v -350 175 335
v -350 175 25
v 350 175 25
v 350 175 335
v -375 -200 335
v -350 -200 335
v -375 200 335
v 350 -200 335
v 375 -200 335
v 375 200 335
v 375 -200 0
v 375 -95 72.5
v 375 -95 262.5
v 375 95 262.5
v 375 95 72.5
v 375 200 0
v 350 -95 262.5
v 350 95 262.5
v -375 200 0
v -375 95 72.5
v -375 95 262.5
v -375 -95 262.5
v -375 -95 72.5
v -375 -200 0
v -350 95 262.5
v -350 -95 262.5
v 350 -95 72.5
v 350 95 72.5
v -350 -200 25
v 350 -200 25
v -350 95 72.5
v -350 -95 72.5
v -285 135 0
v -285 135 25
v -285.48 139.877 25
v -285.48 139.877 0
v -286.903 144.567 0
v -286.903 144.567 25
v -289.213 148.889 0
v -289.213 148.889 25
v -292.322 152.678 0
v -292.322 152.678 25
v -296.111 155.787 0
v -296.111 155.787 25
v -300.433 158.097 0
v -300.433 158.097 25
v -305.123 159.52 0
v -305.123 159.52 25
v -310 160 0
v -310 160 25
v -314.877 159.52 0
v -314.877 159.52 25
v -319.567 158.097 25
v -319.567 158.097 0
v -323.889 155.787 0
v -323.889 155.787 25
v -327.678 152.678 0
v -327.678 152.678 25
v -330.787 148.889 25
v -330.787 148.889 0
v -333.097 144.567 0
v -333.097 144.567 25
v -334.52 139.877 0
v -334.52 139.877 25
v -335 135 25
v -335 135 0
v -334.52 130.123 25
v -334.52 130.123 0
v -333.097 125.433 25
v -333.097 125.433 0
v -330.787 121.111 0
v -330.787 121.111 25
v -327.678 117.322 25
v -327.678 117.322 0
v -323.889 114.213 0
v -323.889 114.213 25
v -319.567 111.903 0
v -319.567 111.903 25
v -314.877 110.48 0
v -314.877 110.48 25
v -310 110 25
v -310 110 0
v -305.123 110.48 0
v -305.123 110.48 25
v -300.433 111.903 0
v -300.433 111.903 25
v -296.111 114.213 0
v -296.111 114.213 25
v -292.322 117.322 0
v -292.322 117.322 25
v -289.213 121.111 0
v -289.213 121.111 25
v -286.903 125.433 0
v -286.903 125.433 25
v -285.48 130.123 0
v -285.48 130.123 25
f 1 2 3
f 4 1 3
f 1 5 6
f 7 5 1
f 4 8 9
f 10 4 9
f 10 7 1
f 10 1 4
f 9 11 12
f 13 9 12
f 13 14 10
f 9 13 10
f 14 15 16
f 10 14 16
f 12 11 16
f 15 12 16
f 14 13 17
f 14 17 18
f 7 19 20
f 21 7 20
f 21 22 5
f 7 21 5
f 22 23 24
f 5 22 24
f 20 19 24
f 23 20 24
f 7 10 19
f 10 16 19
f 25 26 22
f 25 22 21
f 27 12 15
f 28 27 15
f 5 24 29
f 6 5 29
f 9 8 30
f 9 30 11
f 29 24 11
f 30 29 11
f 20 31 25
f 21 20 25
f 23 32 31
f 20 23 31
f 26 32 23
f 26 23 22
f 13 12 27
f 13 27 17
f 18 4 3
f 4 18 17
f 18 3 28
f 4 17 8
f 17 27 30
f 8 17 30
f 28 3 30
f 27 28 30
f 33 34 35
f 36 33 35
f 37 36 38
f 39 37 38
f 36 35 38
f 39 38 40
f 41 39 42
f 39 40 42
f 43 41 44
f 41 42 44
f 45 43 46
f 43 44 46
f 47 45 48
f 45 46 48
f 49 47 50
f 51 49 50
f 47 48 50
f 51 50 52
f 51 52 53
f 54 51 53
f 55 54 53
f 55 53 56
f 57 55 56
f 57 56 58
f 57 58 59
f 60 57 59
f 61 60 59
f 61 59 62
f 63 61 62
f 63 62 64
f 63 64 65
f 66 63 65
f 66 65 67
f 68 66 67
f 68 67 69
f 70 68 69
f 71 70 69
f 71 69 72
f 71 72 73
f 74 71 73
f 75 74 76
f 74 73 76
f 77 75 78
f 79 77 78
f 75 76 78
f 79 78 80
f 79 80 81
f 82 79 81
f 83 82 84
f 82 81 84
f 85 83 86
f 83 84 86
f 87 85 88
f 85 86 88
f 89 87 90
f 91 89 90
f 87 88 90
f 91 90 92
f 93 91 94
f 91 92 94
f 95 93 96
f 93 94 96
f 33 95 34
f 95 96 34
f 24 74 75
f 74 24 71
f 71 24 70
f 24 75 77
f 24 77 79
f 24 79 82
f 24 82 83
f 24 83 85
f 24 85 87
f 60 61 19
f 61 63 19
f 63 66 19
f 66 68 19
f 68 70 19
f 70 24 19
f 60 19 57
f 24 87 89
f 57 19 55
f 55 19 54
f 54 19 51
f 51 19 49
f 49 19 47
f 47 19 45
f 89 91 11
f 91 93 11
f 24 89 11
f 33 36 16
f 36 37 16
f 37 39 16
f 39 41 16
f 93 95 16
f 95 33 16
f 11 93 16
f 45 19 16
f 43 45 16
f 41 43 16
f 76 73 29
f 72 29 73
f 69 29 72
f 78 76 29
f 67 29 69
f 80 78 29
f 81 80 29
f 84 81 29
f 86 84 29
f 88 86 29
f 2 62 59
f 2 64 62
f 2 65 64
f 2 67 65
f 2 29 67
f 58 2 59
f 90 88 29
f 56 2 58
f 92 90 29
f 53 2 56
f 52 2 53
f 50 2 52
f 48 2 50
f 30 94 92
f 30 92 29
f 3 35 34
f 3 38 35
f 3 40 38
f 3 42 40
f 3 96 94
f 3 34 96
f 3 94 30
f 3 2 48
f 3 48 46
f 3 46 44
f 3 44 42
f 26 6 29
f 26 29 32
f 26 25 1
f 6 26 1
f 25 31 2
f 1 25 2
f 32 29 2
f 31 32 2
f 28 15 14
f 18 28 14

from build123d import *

# Parameters (mm, degrees)
F0_W     = 750
F0_H     = 400
F1_DEPTH = 25
F3_DEPTH = 310
F4_W     = 190
F4_H     = 190
F5_DEPTH = 750.001
F6_R     = 25
F7_DEPTH = 25.001


with BuildPart() as f1:
    # F0 (on Top) → F1 (new body)
    with BuildSketch(Plane.XY):
        Rectangle(F0_W, F0_H)
    extrude(amount=F1_DEPTH)

    # F2 (on face) → F3 (join)
    with BuildSketch(Plane.XY.offset(25)):
        Polygon((-350, -200), (-350, 175), (350, 175), (350, -200), (375, -200), (375, 200), (-375, 200), (-375, -200), align=None)
    extrude(amount=F3_DEPTH)

    # F4 (on face) → F5 (cut, through all)
    with BuildSketch(Plane.YZ.offset(375)):
        with Locations((0, 167.5)):
            Rectangle(F4_W, F4_H)
    extrude(amount=-F5_DEPTH, mode=Mode.SUBTRACT)

    # F6 (on face) → F7 (cut, through all)
    with BuildSketch(Plane.XY.offset(25)):
        with Locations((-310, 135)):
            Circle(F6_R)
    extrude(amount=-F7_DEPTH, mode=Mode.SUBTRACT)


solid = f1.part
